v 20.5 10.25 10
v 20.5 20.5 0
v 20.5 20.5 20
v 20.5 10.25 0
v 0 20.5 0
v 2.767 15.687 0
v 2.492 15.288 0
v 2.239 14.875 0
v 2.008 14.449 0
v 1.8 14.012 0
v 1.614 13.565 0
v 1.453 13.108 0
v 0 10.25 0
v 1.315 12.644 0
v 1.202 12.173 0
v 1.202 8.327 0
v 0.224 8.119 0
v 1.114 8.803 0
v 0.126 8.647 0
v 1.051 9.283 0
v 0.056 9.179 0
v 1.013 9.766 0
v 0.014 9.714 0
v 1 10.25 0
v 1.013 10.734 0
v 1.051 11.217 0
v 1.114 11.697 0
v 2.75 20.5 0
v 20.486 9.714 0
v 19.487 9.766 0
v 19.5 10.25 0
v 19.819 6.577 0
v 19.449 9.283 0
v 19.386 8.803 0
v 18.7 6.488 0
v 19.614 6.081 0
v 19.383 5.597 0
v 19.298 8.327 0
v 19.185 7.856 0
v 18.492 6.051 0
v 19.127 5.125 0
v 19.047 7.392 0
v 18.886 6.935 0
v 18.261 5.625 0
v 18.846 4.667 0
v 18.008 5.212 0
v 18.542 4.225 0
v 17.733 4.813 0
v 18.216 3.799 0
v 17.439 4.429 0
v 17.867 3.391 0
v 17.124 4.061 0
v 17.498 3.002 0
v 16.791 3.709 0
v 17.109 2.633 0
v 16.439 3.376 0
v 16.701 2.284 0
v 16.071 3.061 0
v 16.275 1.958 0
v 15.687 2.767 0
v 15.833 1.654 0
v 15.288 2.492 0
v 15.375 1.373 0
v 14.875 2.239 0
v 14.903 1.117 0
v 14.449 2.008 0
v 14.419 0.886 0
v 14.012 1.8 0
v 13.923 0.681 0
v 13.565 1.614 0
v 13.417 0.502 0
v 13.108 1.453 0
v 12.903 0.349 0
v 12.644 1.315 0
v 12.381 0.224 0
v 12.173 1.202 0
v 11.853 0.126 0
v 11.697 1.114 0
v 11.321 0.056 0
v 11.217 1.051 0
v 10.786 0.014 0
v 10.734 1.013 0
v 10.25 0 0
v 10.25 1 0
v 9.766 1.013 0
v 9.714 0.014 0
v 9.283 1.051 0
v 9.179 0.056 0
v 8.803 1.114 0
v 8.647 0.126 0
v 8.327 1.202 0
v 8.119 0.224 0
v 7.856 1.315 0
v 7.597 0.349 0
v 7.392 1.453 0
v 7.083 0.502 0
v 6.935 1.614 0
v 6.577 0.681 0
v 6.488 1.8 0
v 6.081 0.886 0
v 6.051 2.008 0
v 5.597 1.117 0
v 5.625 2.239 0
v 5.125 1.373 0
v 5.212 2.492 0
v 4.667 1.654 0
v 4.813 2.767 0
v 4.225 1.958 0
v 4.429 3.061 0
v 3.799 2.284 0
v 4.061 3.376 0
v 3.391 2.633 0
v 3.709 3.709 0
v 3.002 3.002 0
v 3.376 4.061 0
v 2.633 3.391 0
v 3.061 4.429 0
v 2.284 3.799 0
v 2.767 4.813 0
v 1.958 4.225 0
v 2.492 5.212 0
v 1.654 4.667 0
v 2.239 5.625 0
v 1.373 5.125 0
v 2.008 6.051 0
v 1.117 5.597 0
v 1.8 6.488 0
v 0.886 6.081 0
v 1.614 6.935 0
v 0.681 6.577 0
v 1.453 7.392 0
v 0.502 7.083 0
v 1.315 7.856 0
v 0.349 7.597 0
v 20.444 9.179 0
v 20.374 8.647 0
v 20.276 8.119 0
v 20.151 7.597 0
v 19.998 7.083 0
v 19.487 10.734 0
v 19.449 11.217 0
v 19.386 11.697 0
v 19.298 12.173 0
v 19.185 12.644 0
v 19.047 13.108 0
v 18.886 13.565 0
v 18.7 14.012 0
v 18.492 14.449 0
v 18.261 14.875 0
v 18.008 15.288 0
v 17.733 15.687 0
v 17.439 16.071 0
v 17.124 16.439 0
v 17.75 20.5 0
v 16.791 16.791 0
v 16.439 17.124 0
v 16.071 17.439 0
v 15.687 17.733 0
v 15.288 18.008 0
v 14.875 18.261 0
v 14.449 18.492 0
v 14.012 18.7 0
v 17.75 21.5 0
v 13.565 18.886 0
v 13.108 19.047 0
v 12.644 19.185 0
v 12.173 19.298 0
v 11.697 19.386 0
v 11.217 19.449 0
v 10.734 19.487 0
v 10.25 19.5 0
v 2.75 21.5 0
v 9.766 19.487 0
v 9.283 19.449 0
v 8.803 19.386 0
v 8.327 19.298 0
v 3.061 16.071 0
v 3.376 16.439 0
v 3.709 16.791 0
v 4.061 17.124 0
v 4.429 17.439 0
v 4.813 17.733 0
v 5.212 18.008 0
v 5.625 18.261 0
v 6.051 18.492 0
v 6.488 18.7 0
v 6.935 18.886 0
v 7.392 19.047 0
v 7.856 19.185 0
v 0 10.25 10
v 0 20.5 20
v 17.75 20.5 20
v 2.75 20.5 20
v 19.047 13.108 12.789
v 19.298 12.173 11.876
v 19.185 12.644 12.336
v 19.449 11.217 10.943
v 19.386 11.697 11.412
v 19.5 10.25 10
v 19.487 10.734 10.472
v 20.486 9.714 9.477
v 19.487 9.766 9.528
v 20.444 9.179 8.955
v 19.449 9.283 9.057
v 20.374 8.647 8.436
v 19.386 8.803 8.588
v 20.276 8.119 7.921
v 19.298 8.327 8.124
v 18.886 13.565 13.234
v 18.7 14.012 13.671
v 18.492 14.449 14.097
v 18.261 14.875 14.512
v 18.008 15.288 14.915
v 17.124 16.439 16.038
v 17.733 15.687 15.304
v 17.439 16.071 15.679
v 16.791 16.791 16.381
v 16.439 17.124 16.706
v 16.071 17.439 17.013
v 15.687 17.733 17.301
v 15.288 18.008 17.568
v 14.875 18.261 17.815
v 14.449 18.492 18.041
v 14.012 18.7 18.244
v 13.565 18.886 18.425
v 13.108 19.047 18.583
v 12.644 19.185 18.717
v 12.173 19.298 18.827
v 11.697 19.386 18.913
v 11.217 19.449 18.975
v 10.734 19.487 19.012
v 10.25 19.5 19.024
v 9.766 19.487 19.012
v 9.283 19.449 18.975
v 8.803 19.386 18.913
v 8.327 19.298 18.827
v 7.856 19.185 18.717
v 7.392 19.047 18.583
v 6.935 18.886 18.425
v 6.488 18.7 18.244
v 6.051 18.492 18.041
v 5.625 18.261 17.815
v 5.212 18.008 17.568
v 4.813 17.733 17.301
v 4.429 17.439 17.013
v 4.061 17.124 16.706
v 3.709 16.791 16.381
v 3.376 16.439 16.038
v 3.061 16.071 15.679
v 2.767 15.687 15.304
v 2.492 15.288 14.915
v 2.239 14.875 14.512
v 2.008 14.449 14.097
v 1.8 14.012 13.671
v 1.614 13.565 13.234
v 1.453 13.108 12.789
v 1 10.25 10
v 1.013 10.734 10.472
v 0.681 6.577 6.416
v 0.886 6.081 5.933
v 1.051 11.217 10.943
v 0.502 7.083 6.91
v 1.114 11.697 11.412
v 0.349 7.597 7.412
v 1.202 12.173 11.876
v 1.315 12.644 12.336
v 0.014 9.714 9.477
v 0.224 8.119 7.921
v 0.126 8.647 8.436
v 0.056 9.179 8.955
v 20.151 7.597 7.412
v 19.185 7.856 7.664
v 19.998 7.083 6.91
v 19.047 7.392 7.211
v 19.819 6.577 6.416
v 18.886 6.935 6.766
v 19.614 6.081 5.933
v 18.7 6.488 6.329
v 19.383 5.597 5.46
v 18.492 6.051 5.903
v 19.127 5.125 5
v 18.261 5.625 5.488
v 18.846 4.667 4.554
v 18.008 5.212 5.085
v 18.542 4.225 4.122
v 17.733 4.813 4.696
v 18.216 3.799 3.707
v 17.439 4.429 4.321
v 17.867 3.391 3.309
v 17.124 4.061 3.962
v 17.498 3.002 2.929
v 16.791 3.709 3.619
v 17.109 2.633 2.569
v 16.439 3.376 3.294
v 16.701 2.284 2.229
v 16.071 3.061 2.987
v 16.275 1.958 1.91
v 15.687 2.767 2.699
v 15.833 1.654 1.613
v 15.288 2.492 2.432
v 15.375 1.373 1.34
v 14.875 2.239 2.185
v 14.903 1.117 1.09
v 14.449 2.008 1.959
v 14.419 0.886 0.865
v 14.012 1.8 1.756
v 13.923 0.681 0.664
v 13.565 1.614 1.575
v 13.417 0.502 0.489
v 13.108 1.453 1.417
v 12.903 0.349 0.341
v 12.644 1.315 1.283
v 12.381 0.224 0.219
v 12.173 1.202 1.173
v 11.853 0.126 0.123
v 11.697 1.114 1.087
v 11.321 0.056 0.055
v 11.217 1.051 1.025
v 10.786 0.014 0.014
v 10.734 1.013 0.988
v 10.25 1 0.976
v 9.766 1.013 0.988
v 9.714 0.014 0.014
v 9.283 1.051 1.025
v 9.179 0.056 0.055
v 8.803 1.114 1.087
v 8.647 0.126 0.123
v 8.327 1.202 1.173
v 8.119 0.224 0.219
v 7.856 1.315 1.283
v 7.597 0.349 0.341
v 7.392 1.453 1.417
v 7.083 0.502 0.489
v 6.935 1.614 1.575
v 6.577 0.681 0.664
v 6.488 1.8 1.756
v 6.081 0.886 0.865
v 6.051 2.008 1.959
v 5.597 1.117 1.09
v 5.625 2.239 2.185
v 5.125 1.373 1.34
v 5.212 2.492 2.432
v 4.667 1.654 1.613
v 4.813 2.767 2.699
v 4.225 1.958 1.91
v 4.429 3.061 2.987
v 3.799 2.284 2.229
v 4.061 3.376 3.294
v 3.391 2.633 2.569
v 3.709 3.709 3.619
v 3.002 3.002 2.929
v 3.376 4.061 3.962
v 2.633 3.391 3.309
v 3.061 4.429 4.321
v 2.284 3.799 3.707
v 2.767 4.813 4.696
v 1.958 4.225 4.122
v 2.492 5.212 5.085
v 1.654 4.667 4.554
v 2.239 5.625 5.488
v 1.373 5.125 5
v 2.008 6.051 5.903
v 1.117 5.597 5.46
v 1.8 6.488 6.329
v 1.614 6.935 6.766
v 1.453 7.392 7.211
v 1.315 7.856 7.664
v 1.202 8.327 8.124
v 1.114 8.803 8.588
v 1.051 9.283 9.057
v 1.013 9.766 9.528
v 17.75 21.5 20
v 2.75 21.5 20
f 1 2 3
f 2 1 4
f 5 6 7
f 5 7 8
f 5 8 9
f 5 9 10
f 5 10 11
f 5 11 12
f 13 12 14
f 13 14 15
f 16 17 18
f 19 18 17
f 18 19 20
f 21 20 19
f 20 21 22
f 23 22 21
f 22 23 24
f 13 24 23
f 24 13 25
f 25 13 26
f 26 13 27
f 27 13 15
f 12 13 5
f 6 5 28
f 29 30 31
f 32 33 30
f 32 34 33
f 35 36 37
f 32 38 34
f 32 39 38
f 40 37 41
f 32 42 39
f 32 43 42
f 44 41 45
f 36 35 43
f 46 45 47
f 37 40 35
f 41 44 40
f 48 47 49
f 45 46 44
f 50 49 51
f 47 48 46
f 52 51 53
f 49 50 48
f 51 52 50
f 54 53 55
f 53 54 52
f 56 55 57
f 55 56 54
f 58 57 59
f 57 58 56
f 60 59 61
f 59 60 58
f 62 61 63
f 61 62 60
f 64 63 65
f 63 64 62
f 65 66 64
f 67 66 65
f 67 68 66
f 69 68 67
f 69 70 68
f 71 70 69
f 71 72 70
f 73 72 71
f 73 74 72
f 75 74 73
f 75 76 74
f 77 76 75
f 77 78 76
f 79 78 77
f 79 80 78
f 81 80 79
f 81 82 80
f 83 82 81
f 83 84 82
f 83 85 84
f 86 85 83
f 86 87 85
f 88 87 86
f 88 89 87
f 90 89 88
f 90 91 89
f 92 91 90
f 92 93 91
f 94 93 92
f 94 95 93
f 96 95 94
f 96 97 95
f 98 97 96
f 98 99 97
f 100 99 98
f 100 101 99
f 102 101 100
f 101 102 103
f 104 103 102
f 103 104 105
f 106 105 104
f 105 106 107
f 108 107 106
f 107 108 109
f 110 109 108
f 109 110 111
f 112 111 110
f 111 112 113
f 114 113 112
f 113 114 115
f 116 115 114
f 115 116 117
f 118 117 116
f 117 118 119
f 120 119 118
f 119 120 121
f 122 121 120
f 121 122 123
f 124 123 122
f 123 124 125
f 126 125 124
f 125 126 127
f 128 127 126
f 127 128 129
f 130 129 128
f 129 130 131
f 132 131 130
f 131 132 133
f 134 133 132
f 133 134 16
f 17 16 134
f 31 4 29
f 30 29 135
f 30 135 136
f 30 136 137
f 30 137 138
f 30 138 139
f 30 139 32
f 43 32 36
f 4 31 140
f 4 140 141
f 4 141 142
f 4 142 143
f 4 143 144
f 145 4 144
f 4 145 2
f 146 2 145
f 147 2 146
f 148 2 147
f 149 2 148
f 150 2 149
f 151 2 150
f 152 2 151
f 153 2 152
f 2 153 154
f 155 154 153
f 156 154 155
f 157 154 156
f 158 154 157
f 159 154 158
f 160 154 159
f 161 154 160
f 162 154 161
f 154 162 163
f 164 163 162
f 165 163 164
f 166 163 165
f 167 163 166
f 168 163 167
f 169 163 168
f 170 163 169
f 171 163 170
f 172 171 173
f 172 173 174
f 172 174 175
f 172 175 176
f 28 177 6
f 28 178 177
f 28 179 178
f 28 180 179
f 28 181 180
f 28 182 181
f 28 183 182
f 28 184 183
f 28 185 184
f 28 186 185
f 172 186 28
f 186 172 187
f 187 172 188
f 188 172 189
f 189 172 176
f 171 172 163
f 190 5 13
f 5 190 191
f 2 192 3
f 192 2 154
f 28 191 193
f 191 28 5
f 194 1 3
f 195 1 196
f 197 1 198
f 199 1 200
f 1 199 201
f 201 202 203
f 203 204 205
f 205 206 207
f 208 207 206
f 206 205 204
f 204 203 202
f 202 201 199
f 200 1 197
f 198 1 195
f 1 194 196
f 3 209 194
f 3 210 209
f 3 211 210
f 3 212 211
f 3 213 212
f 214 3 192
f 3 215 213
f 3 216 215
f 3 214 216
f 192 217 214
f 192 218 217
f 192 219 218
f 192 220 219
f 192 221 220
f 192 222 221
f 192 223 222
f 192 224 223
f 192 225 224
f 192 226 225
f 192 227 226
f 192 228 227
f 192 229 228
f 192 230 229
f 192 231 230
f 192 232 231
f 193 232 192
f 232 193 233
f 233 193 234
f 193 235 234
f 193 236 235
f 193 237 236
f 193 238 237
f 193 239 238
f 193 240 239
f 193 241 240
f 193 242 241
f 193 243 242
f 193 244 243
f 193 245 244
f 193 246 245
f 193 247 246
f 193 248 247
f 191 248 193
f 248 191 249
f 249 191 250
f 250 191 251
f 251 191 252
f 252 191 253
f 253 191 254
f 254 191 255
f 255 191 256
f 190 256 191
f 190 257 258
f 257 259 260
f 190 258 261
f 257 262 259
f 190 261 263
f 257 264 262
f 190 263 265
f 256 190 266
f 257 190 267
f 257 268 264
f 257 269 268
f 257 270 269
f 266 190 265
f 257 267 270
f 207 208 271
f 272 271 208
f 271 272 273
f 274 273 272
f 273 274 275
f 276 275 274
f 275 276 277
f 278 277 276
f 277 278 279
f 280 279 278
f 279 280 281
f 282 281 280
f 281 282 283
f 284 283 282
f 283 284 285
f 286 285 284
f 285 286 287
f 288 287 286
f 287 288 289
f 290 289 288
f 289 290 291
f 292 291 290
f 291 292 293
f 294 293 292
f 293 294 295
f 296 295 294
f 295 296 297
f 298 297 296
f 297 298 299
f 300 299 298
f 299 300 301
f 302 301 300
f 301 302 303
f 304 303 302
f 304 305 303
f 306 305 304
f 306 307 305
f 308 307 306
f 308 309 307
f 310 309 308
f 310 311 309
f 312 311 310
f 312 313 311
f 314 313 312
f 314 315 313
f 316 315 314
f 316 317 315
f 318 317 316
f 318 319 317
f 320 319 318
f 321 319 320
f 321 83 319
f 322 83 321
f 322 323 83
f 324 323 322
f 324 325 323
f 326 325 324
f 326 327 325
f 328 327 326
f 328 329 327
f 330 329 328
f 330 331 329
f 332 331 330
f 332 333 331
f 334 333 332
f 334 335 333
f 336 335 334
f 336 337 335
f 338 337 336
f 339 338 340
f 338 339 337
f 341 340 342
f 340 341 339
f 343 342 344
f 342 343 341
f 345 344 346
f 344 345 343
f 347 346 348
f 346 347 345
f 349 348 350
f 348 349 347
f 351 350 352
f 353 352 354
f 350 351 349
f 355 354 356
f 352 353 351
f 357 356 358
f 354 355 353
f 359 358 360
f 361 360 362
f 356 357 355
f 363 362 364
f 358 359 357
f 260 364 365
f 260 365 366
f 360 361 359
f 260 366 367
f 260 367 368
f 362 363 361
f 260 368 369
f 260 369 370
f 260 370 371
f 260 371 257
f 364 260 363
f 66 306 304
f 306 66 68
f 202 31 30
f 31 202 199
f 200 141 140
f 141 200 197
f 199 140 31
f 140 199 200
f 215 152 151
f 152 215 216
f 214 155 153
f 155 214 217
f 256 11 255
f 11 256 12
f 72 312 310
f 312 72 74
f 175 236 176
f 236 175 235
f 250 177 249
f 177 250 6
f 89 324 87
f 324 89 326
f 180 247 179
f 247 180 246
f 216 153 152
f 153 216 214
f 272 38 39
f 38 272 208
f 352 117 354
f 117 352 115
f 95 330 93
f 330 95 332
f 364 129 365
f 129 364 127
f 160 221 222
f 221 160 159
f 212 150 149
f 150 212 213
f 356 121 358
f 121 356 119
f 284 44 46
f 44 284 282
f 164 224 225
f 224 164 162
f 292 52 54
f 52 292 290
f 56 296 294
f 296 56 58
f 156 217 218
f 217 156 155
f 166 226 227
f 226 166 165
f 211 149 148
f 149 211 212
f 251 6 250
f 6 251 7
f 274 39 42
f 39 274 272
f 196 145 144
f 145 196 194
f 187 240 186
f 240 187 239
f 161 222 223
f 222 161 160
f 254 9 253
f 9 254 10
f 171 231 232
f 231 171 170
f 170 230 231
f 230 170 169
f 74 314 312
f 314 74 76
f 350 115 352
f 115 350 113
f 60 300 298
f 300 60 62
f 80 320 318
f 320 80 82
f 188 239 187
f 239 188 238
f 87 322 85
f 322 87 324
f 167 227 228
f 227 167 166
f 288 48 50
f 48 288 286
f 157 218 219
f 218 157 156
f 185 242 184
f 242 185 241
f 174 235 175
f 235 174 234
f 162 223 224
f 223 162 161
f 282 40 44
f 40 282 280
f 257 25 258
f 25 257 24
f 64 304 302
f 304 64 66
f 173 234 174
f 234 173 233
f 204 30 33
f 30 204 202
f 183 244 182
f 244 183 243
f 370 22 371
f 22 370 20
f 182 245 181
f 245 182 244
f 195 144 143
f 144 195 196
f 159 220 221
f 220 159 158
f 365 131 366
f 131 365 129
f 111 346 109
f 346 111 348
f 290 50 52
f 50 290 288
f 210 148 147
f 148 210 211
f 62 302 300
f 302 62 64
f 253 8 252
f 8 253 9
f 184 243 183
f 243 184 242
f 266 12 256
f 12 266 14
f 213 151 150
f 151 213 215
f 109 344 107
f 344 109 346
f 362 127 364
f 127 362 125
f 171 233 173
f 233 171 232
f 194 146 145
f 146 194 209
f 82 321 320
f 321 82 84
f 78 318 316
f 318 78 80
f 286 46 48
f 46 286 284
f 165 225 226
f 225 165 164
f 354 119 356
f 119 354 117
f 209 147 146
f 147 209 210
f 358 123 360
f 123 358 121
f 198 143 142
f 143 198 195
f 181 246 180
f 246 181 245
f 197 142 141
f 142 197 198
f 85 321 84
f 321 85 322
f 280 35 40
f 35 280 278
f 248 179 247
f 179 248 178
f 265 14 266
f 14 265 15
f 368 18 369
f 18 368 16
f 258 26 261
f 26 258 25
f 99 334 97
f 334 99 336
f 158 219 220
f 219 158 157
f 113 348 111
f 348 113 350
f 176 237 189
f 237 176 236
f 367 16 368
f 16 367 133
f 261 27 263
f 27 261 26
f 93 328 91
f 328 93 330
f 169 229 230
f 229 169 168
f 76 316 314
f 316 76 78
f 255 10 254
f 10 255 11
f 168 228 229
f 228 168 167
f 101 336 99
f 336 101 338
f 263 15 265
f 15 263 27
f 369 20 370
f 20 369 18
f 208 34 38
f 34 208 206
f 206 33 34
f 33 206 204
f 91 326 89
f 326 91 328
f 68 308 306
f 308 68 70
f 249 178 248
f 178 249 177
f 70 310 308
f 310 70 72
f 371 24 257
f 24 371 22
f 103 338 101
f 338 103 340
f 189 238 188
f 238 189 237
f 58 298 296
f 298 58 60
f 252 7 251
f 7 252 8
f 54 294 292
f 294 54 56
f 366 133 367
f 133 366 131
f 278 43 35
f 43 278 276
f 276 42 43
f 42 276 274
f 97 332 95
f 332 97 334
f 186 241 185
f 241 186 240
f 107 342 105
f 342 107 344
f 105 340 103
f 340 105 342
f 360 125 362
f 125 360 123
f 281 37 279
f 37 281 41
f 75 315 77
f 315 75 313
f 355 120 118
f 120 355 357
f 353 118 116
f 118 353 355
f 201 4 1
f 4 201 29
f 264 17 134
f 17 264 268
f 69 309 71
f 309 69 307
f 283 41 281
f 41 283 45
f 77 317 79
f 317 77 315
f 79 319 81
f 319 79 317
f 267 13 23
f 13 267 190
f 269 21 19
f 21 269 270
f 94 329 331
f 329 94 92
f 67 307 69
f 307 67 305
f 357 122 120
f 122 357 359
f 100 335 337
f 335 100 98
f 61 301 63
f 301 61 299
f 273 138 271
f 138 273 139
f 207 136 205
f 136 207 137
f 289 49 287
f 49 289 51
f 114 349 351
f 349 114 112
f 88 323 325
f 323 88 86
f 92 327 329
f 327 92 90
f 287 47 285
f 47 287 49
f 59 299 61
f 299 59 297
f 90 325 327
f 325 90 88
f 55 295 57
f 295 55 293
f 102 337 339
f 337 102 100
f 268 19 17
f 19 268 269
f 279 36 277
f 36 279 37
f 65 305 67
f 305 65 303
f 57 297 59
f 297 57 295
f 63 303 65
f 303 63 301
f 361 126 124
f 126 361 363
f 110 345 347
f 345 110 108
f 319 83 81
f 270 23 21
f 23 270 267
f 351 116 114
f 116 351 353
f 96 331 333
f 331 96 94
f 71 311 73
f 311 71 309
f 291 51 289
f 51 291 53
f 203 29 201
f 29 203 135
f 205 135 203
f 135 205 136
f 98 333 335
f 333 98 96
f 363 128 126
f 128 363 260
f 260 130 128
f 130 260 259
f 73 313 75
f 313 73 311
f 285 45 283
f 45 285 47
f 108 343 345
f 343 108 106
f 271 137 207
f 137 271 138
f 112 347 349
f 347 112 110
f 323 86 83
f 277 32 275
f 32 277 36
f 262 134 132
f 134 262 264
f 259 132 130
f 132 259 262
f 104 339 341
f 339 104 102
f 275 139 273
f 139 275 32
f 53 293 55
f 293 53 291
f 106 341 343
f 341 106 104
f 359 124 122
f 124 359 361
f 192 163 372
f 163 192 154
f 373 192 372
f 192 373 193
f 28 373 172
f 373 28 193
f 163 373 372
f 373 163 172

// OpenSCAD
//SLEEK RING EASY
detail = 120;


//sleek_ring_easy(finger_diameter, ring_thickness, lid_thickness, top_x, top_z)
sleek_ring_easy(18.5, 1, 1, 15, 20);

module triangle(x, y, height) {
    a = max(x, y, height);
    resize([x, y, height])
    difference() {
        cube([a,a,a]);
        rotate([45,0,0])
        translate([-1,0,0])
        cube([a +2, a * a, a]);
    }
}

module triangle_with_finger_cut(effective_x, top_z, finger_diameter) {
    difference() {
        triangle(effective_x, effective_x, top_z);
        translate([effective_x / 2, effective_x / 2, -1])
        cylinder(h=top_z + 2, d=finger_diameter, $fn=detail);
    }
}

module ring(effective_x, top_z, finger_diameter, effective_ring_thickness) {
    translate([effective_x / 2, effective_x / 2, -1])
    cylinder(h=top_z + 2, d=finger_diameter + effective_ring_thickness * 2, $fn=detail);
}

module triangle_ring(effective_x, top_z, finger_diameter, effective_ring_thickness) {
    intersection() {
        triangle_with_finger_cut(effective_x, top_z, finger_diameter);
        ring(effective_x, top_z, finger_diameter, effective_ring_thickness);
    }
}

module triangle_ring_lidless(finger_diameter, effective_ring_thickness, effective_x, top_z) {
    union() {
        triangle_ring(effective_x, top_z, finger_diameter, effective_ring_thickness);
        intersection() {

            triangle_with_finger_cut(            effective_x, top_z, finger_diameter);
            translate([0, effective_x / 2, 0])
            cube([effective_x, effective_x / 2, top_z]);
        }
    }
}

module lid(top_x, top_z, effective_x, lid_thickness) {
    translate([(effective_x - top_x) / 2, effective_x - 0.0, 0])
    cube([top_x, lid_thickness, top_z]); 
}

module sleek_ring_easy(finger_diameter, ring_thickness, lid_thickness, top_x, top_z) {
    effective_ring_thickness = max(ring_thickness, top_x - (finger_diameter + ring_thickness));
    effective_x = max(top_x, finger_diameter + 2 * effective_ring_thickness);
    union() {
        triangle_ring_lidless(finger_diameter, effective_ring_thickness, effective_x, top_z);
        lid(top_x, top_z, effective_x, lid_thickness);
    }
}
